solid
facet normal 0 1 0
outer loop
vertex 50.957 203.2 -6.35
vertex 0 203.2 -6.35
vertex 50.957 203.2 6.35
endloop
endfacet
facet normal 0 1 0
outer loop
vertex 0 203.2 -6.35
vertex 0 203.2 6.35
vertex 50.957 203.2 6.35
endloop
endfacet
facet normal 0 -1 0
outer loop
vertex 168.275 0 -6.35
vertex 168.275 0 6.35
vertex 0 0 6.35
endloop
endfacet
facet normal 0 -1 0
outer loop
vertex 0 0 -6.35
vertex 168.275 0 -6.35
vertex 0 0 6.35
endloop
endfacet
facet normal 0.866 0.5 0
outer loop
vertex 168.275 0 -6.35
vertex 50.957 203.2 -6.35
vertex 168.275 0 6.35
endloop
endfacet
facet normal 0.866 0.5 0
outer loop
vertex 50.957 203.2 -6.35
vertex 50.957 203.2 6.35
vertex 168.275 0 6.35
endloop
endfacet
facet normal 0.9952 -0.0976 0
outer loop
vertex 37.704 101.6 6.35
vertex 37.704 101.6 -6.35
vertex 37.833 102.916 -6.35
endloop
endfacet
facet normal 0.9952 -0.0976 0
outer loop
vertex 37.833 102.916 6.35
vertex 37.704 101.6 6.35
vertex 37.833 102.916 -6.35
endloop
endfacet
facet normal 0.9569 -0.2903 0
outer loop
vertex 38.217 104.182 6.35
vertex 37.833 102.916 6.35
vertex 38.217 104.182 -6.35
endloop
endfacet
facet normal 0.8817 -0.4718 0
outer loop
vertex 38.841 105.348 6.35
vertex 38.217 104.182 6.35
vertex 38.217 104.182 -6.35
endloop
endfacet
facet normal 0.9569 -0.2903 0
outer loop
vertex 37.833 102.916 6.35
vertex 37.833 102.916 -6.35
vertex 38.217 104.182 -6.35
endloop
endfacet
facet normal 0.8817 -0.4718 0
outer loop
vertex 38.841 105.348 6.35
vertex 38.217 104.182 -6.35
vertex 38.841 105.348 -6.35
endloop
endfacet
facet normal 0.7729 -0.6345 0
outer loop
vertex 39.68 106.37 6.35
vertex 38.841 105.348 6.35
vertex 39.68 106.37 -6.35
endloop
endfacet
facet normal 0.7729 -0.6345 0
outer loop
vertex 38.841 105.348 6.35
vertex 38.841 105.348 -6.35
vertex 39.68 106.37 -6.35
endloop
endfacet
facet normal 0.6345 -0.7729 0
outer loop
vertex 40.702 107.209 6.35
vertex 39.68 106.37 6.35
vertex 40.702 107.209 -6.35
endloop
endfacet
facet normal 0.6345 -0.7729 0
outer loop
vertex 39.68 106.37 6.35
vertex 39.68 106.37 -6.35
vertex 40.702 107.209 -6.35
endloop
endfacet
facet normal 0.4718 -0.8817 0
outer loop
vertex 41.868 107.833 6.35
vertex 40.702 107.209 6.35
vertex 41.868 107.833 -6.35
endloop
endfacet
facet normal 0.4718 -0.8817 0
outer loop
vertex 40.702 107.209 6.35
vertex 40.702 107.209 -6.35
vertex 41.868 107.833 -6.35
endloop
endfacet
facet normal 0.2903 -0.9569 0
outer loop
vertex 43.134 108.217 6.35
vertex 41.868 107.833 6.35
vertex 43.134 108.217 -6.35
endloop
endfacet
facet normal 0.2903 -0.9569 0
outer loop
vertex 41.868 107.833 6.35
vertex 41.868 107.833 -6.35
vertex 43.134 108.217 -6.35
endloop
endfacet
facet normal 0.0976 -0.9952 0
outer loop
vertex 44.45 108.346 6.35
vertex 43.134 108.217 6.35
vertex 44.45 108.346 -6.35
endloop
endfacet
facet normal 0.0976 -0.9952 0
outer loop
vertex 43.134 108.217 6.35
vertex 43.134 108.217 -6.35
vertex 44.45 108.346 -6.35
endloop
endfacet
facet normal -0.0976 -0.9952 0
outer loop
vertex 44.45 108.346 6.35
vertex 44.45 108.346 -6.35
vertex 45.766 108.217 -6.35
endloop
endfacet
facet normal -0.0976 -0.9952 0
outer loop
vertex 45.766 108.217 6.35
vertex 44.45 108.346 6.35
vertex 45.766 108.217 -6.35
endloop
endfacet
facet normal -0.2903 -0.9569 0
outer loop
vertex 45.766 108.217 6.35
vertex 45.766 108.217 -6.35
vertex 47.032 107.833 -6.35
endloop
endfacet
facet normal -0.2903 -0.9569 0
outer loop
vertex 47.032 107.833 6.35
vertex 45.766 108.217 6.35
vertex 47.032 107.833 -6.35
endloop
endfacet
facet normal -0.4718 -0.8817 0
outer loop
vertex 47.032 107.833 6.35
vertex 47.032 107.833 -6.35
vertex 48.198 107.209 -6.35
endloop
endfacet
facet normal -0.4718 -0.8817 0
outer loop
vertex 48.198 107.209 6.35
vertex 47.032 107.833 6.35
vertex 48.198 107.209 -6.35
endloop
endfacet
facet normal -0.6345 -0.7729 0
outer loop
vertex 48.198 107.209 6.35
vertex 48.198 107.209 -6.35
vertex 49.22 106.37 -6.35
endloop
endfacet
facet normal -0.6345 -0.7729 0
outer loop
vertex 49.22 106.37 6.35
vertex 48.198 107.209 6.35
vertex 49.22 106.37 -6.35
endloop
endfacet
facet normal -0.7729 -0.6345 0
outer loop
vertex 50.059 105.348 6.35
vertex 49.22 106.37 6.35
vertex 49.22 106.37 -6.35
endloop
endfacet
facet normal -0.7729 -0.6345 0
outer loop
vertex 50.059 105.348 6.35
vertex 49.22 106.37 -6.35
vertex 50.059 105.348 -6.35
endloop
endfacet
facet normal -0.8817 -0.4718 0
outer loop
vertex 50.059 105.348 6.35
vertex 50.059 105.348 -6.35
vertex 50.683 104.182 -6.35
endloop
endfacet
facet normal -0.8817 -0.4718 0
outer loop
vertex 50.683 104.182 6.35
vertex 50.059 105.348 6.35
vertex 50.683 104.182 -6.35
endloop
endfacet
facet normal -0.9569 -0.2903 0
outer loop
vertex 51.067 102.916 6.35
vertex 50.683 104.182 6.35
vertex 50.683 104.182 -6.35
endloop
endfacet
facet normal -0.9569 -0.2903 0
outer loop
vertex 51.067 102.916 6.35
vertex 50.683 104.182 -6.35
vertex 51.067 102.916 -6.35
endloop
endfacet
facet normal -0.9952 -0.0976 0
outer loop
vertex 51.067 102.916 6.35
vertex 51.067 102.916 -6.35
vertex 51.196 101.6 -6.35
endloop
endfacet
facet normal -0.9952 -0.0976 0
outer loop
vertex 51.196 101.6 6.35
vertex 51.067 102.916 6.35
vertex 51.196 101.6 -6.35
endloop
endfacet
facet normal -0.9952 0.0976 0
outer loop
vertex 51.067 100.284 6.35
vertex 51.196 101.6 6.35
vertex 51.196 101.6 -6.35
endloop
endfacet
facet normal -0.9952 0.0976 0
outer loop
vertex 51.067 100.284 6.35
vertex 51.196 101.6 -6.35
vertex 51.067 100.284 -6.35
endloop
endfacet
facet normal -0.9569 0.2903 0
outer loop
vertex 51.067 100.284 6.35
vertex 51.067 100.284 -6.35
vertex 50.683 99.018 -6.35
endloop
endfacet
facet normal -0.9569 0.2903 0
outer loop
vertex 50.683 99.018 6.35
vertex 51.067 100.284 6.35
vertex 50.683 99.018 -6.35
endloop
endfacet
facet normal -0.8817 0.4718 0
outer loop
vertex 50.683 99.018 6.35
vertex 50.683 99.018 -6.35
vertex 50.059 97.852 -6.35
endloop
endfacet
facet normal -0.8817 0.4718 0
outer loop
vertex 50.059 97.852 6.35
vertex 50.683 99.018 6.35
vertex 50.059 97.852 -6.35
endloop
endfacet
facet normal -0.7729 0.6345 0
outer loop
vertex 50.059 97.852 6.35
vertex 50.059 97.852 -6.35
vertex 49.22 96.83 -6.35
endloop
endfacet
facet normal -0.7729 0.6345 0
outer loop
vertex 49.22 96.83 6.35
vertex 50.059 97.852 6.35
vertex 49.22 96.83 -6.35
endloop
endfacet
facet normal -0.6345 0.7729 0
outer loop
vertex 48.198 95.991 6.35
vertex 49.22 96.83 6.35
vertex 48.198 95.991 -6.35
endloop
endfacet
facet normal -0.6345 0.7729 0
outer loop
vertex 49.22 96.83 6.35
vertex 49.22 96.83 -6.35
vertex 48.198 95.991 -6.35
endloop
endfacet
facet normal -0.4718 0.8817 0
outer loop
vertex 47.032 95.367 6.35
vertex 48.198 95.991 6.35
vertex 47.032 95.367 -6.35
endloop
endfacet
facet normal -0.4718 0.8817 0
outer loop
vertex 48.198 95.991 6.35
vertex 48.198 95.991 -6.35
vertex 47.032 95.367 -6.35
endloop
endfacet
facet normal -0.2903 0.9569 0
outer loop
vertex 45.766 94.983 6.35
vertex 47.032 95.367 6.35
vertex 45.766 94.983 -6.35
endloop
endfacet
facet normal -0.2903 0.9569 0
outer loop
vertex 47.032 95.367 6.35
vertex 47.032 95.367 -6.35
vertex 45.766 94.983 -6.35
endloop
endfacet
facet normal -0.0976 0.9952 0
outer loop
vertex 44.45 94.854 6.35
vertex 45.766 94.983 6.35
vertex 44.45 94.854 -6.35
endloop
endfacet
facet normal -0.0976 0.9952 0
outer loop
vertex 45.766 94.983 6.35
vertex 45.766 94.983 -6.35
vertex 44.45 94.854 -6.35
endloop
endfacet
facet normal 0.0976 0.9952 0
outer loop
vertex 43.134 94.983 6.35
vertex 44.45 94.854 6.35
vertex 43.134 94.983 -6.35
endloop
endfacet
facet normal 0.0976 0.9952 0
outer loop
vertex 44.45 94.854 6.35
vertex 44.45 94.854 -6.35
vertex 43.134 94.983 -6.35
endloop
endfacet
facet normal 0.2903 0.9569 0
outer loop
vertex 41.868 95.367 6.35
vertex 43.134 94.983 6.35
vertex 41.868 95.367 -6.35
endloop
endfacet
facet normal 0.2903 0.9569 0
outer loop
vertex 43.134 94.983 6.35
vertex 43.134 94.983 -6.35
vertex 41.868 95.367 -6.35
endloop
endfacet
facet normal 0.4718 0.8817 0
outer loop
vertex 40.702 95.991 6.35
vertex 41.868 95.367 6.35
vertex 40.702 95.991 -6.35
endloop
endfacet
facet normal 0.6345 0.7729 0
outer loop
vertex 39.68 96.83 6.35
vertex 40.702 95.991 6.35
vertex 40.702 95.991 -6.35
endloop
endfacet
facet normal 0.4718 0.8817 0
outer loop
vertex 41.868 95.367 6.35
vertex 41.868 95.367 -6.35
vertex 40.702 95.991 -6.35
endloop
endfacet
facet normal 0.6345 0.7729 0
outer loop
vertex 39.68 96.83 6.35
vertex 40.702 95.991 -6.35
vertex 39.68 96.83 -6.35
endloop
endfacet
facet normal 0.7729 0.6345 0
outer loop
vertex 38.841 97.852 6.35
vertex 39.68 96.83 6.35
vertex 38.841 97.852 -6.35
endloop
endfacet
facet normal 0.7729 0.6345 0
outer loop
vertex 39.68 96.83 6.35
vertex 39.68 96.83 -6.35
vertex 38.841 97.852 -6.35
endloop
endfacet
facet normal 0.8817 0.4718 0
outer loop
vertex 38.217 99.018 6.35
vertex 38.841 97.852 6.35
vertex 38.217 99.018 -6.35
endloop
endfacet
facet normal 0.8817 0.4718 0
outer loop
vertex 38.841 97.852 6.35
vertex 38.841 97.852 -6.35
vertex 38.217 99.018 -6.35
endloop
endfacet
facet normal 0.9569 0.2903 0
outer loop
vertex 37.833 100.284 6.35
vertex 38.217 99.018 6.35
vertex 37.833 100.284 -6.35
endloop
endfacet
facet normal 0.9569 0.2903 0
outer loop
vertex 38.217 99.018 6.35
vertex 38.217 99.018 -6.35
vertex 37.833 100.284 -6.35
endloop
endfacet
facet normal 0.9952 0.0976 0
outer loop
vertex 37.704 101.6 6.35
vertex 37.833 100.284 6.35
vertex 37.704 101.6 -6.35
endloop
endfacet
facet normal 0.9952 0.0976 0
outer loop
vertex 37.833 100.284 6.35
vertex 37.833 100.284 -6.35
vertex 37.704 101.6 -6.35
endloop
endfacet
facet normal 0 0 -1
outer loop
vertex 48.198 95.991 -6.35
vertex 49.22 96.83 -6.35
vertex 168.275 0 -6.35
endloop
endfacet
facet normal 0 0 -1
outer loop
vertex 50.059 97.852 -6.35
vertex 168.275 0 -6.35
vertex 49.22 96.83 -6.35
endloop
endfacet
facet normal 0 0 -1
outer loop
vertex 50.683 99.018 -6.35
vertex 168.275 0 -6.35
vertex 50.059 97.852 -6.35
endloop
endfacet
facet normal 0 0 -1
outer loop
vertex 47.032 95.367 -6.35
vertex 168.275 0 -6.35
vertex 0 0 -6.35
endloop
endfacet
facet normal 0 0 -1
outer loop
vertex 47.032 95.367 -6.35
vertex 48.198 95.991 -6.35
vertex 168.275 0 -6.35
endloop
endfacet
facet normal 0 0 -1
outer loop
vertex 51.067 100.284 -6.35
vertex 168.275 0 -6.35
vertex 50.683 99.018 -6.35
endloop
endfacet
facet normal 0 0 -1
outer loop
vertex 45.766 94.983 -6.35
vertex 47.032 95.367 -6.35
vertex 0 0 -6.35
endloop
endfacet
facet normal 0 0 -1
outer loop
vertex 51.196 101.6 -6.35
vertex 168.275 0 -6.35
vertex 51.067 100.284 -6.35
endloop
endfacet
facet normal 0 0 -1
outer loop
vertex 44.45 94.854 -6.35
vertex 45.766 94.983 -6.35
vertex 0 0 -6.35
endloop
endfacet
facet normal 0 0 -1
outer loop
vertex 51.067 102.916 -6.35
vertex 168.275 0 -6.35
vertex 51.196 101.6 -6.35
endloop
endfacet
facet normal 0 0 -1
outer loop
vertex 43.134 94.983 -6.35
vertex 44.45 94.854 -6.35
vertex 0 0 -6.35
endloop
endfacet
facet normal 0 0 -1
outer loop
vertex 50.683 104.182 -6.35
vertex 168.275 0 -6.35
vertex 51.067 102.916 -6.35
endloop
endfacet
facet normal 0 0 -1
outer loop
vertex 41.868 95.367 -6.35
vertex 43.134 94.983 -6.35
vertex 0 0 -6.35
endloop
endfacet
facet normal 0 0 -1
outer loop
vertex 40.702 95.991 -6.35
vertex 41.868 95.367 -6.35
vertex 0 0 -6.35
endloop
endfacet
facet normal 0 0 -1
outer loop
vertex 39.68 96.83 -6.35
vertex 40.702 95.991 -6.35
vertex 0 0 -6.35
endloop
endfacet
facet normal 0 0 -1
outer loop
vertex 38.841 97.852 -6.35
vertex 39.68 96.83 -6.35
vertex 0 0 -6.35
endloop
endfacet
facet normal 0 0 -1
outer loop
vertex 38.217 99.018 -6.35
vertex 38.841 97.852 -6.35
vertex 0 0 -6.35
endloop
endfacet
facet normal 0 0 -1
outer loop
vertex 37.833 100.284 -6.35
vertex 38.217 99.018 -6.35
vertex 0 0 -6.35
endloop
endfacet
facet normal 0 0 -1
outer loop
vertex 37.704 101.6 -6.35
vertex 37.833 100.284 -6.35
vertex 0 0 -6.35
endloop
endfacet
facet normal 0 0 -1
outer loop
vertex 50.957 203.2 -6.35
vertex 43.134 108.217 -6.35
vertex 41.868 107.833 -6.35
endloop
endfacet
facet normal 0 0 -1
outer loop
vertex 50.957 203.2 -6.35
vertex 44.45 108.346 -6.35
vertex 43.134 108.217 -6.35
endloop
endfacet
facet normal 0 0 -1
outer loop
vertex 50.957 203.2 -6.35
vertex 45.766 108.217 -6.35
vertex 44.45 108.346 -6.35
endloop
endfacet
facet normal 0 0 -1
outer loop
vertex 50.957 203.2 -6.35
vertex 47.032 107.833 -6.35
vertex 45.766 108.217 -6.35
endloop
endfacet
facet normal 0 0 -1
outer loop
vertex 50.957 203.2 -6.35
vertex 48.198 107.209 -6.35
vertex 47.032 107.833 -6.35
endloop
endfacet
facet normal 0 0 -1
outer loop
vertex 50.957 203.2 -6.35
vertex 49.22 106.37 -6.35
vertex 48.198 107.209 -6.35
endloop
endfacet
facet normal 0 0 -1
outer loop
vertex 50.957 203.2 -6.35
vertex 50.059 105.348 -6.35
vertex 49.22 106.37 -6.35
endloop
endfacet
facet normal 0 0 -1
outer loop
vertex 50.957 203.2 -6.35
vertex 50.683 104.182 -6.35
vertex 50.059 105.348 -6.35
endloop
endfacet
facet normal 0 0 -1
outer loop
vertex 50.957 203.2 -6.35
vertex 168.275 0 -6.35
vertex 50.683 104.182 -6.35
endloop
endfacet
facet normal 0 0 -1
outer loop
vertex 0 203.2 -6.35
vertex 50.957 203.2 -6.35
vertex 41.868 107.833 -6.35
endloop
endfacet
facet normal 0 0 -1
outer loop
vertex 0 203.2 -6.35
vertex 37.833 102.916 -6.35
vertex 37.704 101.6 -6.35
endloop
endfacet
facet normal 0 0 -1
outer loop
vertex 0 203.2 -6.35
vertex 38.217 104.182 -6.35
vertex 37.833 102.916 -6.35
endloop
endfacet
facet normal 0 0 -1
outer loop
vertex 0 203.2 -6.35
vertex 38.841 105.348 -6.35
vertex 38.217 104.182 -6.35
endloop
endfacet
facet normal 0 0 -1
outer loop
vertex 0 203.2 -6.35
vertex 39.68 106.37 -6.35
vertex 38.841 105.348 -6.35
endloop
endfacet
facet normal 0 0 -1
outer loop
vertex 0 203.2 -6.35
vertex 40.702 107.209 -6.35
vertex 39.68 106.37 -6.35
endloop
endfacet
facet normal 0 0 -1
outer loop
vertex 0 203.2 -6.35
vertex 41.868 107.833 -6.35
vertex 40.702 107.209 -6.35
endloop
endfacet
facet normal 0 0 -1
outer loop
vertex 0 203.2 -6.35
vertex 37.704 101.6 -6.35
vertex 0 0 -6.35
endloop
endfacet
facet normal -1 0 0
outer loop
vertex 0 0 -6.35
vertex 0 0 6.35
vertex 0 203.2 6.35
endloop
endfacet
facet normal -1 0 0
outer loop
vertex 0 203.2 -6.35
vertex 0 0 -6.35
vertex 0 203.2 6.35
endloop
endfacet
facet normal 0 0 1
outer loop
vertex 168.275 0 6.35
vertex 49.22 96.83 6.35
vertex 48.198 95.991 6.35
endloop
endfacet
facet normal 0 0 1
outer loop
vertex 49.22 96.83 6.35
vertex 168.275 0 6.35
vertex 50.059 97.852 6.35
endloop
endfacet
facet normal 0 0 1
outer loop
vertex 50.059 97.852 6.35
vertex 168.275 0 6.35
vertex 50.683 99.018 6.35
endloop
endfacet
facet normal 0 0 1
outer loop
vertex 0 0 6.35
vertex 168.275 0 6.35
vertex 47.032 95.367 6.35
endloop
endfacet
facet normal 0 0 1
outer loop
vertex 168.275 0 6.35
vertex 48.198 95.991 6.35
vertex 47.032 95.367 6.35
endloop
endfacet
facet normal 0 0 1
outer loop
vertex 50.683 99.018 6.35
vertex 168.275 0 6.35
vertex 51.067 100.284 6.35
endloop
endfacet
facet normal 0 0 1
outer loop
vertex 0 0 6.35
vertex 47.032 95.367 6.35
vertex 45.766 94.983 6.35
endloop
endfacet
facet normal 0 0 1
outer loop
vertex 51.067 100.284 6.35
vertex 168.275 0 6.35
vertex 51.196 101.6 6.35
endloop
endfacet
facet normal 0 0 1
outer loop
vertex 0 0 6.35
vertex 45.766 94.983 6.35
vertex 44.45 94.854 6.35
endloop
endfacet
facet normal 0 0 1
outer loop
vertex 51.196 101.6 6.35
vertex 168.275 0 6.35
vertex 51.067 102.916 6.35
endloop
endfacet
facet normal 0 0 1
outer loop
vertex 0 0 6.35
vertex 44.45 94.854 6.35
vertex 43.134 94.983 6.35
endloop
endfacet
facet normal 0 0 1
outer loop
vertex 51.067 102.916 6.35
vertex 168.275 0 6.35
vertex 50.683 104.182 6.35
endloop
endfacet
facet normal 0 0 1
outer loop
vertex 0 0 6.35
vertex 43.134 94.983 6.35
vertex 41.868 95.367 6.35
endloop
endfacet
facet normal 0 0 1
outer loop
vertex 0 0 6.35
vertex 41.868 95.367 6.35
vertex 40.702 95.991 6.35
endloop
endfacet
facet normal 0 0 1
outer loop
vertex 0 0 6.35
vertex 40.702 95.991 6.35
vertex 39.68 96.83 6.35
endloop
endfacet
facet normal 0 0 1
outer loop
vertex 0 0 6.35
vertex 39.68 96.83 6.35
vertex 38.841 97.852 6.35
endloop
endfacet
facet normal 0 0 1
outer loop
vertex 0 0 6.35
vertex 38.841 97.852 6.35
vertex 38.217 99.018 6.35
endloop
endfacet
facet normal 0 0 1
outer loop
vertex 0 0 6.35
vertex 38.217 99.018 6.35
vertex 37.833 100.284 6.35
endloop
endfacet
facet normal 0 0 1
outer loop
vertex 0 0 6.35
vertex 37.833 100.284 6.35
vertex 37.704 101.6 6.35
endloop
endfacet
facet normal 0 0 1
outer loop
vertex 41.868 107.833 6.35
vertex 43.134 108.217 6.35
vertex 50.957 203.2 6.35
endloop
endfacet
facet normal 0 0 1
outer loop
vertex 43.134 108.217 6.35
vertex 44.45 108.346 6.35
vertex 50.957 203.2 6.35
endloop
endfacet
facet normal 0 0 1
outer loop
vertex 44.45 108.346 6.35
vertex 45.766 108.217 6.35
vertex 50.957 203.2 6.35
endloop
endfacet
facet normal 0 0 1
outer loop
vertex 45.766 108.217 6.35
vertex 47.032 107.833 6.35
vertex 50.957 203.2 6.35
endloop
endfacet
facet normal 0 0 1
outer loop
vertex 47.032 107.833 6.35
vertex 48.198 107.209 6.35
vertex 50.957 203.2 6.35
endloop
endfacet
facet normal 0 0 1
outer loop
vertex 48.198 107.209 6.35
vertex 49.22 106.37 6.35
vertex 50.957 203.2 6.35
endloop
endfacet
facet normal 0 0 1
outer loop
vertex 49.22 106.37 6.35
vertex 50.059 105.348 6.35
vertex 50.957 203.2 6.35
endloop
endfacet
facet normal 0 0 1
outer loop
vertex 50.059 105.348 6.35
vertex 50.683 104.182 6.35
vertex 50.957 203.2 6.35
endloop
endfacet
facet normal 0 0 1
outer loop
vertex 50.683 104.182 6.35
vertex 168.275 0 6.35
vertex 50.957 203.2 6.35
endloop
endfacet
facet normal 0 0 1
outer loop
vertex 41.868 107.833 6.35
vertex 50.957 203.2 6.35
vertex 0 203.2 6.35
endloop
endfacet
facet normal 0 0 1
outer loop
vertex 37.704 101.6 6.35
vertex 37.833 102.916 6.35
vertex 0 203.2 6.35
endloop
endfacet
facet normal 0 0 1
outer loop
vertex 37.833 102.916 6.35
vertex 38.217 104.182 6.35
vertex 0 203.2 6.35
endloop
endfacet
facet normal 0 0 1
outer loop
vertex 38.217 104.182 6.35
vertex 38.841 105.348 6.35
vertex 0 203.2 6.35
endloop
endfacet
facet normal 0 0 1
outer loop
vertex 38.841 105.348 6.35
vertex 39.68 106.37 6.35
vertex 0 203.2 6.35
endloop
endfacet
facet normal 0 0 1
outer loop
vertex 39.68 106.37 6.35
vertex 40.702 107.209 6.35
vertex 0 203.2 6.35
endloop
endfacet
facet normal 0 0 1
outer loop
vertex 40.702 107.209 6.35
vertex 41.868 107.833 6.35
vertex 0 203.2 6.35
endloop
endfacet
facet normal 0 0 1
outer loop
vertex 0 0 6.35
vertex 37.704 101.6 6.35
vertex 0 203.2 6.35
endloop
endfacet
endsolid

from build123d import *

# Parameters (mm, degrees)
BOSS_EXTRUDE1_DEPTH     = 6.35
F_1_2_CLEARANCE_HOLE1_D = 13.49248


with BuildPart() as part:
    # Sketch1 → Boss-Extrude1 (new, symmetric)
    with BuildSketch(Plane.XY):
        Polygon((0, 0), (0, 203.2), (50.957425301, 203.2), (168.275, 0), align=None)
    extrude(amount=BOSS_EXTRUDE1_DEPTH, both=True)

    # 1/2 Clearance Hole1 (through all)
    with Locations(Plane.XY.offset(6.35)):
        with Locations((44.45, 101.6)):
            Hole(F_1_2_CLEARANCE_HOLE1_D / 2)


solid = part.part
